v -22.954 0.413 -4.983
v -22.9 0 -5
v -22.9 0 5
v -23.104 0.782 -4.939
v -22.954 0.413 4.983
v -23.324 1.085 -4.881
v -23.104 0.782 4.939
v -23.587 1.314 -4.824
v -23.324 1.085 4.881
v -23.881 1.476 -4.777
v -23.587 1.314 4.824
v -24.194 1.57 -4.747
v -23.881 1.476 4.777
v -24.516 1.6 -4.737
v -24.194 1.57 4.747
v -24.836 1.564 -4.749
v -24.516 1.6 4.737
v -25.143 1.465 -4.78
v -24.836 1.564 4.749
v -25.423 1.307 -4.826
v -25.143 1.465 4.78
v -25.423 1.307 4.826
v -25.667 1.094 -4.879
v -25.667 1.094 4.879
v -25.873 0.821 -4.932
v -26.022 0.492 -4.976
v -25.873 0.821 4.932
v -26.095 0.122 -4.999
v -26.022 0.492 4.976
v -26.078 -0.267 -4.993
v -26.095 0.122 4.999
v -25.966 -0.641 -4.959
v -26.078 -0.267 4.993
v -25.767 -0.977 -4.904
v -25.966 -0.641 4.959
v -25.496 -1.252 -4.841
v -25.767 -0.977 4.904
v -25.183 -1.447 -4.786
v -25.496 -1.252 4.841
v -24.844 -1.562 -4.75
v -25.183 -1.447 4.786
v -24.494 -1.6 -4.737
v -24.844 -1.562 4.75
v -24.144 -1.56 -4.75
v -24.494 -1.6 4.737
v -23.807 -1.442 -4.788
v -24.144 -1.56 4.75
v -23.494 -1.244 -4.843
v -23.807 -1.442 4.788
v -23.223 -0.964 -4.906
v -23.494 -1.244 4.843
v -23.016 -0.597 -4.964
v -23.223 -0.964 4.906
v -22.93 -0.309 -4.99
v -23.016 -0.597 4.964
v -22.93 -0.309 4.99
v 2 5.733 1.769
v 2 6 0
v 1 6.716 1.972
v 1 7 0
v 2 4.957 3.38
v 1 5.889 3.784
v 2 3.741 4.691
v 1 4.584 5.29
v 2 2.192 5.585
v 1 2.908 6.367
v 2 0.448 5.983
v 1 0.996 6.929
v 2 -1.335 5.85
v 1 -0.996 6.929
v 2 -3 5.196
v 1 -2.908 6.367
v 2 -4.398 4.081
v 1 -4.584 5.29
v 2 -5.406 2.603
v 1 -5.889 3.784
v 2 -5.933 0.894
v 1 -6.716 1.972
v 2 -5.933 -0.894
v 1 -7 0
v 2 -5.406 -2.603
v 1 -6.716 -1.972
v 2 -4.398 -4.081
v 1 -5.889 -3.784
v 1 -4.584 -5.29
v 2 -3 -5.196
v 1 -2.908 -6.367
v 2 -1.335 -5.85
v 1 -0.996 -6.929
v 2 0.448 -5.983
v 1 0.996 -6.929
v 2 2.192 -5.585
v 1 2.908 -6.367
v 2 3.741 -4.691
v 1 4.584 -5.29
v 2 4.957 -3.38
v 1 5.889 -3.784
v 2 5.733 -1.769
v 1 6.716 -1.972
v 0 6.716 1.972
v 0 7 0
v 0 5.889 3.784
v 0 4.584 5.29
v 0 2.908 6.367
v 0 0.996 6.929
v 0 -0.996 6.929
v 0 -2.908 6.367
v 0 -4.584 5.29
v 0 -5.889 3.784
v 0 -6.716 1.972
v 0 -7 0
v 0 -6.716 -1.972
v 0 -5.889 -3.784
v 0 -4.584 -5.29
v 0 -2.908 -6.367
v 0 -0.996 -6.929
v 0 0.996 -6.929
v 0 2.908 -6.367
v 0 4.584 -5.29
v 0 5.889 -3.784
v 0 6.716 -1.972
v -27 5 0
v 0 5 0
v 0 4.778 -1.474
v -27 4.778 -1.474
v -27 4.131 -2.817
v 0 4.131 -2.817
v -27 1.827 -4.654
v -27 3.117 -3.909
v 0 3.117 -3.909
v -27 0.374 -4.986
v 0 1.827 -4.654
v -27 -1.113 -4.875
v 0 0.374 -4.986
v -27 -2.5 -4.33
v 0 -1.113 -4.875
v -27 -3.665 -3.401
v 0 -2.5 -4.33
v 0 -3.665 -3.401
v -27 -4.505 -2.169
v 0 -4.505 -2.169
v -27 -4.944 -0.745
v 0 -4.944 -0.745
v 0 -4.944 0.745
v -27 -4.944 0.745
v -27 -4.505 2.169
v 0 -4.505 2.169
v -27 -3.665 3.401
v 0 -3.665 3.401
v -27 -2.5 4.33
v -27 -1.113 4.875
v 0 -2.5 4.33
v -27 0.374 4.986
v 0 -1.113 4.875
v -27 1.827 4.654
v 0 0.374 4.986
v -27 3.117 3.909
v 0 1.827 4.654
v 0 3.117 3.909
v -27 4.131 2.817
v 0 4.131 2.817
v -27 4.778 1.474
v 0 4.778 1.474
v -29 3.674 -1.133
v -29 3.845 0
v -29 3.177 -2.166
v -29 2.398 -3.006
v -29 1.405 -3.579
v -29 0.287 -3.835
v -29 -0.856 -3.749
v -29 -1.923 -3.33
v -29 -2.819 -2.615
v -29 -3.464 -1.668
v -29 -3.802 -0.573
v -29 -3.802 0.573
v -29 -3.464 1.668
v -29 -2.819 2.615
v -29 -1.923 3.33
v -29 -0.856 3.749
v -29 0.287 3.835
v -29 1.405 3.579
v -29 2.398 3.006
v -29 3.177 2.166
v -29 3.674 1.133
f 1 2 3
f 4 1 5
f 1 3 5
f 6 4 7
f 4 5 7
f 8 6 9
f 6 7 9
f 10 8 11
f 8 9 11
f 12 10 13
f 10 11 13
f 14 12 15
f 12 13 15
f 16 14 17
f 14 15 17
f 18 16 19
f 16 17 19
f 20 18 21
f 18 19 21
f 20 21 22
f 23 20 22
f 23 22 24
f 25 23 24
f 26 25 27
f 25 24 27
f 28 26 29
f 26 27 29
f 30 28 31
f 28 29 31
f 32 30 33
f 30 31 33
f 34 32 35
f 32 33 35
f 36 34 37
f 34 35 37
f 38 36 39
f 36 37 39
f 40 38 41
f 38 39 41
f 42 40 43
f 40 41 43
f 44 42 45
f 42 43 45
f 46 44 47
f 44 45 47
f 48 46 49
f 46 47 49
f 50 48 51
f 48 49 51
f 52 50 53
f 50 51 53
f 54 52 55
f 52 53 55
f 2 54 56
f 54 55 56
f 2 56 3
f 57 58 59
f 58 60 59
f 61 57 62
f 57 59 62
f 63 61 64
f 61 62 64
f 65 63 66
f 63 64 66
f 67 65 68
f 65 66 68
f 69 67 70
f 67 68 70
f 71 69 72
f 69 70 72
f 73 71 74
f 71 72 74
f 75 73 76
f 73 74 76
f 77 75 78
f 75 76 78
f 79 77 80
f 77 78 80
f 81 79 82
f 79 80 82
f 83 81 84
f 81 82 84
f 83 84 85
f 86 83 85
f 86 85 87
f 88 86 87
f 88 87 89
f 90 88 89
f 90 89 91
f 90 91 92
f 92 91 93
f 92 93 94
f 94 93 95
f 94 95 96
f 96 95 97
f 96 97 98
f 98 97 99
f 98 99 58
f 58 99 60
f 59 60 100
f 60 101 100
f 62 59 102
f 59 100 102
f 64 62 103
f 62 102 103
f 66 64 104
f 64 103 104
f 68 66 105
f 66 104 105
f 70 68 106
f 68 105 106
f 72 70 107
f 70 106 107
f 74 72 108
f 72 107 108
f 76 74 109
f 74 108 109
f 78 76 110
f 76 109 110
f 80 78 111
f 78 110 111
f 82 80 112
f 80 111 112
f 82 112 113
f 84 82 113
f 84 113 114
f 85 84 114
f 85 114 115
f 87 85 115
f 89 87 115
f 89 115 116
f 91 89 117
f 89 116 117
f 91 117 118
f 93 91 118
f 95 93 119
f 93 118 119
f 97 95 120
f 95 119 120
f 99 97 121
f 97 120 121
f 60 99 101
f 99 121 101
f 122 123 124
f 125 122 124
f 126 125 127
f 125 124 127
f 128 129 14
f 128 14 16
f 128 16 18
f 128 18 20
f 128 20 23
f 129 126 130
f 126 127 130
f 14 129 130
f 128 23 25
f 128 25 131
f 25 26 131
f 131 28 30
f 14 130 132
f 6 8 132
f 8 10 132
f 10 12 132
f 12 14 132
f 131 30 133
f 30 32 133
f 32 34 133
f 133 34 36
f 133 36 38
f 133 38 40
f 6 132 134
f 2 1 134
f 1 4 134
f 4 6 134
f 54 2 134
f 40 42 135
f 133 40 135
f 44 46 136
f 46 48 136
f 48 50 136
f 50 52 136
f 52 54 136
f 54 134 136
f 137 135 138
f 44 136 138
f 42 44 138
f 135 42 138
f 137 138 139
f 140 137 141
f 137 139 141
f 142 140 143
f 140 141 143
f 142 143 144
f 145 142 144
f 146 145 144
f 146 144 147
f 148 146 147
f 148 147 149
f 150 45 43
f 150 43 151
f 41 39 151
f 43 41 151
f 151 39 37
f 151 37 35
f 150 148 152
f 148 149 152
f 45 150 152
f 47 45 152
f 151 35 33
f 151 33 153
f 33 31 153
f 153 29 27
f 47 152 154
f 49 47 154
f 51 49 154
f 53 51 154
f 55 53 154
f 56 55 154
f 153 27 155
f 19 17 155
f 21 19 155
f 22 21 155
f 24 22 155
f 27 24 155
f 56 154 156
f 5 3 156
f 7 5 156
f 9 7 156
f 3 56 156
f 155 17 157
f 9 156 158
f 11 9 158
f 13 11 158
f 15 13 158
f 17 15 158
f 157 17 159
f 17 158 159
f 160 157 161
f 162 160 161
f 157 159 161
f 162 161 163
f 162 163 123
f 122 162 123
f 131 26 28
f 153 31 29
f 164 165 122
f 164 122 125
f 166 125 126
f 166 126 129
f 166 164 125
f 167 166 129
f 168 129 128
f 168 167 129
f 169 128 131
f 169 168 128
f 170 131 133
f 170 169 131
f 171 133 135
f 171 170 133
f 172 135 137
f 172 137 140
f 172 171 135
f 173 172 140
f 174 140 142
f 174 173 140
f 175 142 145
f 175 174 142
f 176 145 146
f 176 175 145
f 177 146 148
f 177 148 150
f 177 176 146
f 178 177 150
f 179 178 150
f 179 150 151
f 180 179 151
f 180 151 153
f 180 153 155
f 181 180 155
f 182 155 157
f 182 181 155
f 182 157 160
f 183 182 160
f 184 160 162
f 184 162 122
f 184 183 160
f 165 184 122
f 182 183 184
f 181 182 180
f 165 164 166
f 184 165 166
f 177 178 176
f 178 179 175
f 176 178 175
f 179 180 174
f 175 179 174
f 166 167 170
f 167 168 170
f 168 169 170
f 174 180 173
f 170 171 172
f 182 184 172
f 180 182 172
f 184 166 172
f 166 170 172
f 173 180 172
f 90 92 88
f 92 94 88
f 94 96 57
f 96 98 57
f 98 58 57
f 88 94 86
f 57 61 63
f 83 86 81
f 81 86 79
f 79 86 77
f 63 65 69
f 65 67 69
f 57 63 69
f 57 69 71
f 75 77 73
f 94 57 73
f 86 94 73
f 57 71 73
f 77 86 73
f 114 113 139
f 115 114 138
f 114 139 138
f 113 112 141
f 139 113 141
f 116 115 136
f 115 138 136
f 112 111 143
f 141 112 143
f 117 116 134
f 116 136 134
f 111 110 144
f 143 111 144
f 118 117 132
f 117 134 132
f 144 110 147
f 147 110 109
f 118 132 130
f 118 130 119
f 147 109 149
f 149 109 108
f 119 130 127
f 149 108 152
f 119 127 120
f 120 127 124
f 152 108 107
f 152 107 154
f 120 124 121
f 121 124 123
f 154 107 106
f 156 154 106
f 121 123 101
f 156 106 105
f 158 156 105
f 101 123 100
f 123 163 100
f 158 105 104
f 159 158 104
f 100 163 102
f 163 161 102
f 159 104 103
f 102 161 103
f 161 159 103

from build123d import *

# Parameters (mm, degrees)
SKETCH1_W              = 29
SKETCH1_H              = 5
HEAD_CHAMFER_SIZE      = 2
HEAD_CHAMFER_SIZE2     = 1.154700538
SKETCH21_R             = 1.6
R_CLIP_HOLE_DEPTH      = 8
R_CLIP_HOLE_DEPTH_BACK = 8


with BuildPart() as part:
    # Sketch1 → Body Revolve (revolve)
    with BuildSketch(Plane.XY):
        with Locations((-14.5, 2.5)):
            Rectangle(SKETCH1_W, SKETCH1_H)
    revolve(axis=Axis((0, 0, 0), (-1, 0, 0)))

    # Sketch14 → Head Revolve (revolve)
    with BuildSketch(Plane.XY):
        Polygon((0, 0), (2, 0), (2, 6), (1, 7), (0, 7), align=None)
    revolve(axis=Axis((0, 0, 0), (1, 0, 0)))

    # Head Chamfer
    head_chamfer_edges = [part.edges().sort_by_distance(p)[0] for p in [
        (-29, -5, 0),
    ]]
    head_chamfer_side = [part.faces().sort_by_distance(p)[0] for p in [
        (-14.5, -5, 0),
    ]]
    chamfer(head_chamfer_edges, length=HEAD_CHAMFER_SIZE, length2=HEAD_CHAMFER_SIZE2, reference=head_chamfer_side[0])

    # Sketch21 → R Clip Hole (cut, two sides)
    with BuildSketch(Plane.XY) as r_clip_hole_sk:
        with Locations((-24.5, 0)):
            Circle(SKETCH21_R)
    extrude(amount=R_CLIP_HOLE_DEPTH, mode=Mode.SUBTRACT)
    extrude(r_clip_hole_sk.sketch, amount=-R_CLIP_HOLE_DEPTH_BACK, mode=Mode.SUBTRACT)


solid = part.part
